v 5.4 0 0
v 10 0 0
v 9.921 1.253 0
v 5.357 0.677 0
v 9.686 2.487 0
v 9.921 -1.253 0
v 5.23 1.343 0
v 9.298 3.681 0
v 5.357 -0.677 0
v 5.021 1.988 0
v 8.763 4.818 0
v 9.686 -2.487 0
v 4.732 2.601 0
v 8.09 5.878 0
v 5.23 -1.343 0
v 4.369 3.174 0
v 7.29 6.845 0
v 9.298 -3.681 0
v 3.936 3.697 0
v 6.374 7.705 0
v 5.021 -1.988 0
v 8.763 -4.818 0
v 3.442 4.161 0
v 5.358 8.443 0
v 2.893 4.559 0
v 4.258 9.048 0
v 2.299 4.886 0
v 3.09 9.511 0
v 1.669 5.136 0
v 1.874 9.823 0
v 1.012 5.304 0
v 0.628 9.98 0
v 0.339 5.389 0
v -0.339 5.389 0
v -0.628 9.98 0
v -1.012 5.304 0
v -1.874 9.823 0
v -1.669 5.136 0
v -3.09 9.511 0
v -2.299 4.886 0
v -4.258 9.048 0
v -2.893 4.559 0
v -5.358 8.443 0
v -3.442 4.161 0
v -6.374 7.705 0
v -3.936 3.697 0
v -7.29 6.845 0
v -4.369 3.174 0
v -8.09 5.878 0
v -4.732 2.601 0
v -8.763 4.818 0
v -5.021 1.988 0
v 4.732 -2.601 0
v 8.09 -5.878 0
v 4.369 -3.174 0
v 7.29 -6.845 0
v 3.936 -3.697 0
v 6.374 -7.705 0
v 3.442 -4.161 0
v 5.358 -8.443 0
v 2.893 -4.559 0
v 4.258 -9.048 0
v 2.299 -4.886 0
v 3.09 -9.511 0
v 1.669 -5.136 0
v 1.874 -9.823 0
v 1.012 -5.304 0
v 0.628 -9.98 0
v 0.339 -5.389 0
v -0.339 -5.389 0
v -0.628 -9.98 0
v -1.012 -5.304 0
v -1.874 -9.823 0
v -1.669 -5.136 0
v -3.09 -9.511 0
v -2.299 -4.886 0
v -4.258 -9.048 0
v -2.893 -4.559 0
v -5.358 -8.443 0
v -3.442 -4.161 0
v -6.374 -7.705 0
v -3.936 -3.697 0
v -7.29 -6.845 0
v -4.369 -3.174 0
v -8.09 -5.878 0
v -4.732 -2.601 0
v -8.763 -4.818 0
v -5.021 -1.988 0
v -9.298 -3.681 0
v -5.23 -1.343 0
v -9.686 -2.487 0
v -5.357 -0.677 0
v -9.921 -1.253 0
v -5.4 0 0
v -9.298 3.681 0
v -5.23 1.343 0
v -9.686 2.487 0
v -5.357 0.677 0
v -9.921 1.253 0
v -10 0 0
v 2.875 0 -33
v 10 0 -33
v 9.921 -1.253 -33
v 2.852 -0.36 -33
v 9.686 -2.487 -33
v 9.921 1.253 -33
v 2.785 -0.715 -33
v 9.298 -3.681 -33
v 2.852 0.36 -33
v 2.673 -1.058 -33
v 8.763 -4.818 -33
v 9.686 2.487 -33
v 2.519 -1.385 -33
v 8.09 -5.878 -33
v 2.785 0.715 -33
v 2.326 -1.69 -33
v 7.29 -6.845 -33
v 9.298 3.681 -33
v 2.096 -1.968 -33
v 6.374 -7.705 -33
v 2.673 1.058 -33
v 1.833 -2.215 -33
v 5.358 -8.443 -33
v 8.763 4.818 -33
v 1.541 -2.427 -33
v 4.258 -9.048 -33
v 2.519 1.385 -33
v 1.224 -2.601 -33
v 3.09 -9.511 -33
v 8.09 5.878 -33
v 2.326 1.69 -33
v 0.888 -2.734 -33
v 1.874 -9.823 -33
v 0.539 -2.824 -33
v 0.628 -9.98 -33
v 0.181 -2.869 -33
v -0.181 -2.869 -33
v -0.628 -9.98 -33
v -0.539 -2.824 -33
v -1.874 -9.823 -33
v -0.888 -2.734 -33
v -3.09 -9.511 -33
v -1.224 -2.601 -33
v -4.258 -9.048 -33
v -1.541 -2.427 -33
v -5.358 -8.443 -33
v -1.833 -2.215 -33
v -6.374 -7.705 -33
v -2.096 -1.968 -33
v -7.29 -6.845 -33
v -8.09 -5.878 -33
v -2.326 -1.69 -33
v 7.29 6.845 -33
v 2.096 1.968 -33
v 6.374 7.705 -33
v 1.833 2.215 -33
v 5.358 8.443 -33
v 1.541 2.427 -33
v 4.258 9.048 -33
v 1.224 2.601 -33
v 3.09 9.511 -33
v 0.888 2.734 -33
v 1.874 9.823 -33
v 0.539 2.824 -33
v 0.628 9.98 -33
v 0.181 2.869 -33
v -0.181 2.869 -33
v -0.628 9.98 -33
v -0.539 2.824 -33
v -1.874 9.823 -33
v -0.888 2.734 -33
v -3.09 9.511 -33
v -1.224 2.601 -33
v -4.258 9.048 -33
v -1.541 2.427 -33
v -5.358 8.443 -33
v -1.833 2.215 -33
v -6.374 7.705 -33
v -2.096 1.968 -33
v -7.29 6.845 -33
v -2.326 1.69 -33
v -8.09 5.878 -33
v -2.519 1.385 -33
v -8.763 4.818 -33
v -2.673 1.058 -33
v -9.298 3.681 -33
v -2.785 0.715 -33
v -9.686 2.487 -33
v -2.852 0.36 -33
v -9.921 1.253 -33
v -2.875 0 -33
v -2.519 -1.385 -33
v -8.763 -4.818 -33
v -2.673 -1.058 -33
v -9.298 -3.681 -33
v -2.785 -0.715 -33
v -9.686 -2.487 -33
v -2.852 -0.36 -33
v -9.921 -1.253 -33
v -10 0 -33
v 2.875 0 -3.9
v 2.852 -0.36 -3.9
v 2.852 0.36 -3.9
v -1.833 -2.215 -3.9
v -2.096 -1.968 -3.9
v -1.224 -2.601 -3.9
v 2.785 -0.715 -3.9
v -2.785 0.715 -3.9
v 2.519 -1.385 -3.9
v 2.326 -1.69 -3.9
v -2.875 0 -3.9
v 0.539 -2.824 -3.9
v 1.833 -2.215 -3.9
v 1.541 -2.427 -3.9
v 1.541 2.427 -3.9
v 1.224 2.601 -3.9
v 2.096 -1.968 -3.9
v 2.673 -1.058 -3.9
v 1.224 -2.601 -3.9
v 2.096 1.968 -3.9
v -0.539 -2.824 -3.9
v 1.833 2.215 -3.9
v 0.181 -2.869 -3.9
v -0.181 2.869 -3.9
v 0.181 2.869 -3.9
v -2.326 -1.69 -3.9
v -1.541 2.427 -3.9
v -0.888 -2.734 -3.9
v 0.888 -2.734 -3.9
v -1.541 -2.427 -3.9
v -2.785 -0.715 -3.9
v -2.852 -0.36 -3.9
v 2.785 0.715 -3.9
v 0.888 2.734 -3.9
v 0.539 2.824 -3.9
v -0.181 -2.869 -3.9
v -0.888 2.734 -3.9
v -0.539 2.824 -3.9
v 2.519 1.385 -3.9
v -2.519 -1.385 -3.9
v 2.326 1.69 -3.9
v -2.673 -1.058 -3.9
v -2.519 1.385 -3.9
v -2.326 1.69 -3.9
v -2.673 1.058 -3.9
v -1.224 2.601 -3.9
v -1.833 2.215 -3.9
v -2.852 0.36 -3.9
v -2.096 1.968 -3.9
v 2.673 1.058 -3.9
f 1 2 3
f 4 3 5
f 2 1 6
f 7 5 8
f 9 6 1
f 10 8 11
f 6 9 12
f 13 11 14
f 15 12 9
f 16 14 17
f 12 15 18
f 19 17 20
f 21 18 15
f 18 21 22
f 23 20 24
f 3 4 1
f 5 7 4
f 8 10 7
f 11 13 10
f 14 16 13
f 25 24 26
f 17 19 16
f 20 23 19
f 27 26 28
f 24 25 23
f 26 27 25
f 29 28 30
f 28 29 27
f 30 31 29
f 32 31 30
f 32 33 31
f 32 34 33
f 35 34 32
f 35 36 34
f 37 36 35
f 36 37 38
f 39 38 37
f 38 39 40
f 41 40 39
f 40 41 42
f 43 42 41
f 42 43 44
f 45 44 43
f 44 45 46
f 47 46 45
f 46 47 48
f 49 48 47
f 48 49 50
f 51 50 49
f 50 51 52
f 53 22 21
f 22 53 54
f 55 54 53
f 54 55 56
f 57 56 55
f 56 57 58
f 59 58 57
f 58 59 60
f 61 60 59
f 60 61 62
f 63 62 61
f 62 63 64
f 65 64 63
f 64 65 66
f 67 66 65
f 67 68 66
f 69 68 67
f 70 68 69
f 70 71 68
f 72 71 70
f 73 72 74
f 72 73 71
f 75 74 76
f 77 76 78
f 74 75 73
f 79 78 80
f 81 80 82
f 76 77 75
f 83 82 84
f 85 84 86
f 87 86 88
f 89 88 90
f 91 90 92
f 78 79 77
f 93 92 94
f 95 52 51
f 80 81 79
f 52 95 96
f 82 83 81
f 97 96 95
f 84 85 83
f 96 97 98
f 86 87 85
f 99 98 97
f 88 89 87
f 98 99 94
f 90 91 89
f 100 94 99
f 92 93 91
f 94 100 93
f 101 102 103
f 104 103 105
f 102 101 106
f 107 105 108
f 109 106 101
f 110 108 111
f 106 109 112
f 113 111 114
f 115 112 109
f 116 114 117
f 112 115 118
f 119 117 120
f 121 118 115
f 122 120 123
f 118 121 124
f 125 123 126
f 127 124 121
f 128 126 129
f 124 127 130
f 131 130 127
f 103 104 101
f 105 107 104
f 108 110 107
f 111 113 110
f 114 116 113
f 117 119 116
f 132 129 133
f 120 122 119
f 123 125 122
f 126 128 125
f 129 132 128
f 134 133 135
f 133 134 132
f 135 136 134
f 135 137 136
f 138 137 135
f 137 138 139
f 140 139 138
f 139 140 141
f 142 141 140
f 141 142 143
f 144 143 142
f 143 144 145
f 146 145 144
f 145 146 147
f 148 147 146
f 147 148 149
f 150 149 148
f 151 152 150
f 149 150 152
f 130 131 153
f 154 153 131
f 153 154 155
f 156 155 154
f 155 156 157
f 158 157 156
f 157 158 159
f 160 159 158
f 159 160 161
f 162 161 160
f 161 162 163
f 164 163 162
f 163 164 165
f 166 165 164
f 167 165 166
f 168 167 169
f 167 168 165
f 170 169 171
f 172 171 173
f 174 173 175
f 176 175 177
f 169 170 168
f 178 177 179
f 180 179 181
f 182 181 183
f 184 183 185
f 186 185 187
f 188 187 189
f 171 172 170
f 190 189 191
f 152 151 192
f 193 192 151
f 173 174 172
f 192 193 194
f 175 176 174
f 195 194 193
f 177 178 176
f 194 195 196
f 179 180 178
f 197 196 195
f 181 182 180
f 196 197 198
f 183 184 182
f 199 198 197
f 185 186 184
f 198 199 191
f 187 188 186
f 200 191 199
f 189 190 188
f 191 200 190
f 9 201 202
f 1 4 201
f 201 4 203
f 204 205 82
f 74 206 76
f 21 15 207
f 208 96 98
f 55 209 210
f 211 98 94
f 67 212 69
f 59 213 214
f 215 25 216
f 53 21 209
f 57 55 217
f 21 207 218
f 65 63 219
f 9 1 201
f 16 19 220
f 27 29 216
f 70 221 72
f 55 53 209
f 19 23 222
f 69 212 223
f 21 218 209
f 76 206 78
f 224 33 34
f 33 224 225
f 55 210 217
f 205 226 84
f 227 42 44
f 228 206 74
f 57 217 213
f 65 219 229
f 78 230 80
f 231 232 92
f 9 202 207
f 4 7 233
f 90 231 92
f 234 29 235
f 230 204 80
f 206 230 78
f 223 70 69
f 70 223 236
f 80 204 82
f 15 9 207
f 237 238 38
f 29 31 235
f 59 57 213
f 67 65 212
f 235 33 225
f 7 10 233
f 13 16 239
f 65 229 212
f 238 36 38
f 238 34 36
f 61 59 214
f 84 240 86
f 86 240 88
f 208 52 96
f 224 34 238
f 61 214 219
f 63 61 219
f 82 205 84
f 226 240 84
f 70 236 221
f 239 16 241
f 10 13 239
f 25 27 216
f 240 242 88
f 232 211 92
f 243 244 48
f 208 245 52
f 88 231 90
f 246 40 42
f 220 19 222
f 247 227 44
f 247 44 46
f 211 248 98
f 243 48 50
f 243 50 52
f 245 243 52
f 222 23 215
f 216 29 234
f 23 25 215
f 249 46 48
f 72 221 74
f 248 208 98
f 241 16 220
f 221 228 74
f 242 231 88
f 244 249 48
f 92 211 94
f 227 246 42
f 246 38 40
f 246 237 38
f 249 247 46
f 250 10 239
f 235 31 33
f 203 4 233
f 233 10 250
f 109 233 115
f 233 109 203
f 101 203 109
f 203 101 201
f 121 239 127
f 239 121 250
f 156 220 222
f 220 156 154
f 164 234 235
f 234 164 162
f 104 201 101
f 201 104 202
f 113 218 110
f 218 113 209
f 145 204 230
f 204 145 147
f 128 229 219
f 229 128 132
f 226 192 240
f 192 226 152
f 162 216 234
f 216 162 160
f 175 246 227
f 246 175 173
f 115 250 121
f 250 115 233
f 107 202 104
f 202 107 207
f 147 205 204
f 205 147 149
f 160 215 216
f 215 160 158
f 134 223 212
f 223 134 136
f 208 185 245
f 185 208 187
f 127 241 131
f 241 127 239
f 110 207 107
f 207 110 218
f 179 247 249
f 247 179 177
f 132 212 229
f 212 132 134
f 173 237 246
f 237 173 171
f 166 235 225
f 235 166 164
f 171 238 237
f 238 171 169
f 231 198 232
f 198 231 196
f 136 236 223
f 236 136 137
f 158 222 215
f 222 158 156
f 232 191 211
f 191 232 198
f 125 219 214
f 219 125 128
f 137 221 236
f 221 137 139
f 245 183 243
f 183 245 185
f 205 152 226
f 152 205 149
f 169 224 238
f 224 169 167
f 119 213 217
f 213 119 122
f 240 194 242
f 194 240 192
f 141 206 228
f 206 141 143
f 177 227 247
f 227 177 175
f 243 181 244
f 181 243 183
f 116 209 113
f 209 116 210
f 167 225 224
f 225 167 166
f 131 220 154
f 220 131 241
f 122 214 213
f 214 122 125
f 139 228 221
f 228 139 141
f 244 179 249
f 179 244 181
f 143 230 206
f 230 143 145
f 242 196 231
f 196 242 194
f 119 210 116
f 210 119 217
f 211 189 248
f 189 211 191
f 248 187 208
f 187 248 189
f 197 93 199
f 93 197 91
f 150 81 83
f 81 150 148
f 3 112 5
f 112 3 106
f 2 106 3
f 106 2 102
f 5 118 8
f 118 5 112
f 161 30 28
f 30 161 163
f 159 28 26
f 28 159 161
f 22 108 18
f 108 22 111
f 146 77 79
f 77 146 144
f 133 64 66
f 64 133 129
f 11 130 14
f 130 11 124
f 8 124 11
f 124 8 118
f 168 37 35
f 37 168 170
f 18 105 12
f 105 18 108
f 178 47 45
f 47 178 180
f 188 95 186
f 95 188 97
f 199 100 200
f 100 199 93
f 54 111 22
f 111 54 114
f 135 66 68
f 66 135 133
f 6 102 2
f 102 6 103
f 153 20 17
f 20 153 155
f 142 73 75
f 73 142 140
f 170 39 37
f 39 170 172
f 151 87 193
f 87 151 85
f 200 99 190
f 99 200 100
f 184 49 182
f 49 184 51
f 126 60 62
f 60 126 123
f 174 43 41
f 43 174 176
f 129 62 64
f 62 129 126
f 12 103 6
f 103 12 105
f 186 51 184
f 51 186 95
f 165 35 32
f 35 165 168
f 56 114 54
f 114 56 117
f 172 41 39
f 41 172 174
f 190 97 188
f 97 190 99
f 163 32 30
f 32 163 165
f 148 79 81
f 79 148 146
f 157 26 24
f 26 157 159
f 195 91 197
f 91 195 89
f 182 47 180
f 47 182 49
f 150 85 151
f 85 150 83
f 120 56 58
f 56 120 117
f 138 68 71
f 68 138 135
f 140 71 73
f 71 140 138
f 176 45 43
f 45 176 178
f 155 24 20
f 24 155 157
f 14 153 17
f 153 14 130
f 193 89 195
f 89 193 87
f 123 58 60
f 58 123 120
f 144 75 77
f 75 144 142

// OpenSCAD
$fn = 50;


difference() {
	union() {
		translate(v = [0, 0, -33.0000000000]) {
			cylinder(h = 33, r = 10.0000000000);
		}
		cylinder(h = 0, r = 20.0000000000);
	}
	union() {
		translate(v = [0, 0, 0]) {
			rotate(a = [0, 0, 0]) {
				difference() {
					union() {
						#translate(v = [0, 0, -33.0000000000]) {
							cylinder(h = 33, r = 2.6000000000);
						}
						#translate(v = [0, 0, -3.9000000000]) {
							cylinder(h = 3.9000000000, r = 10.0000000000, r1 = 2.8750000000, r2 = 5.4000000000);
						}
						#translate(v = [0, 0, -33.0000000000]) {
							cylinder(h = 33, r = 2.8750000000);
						}
						#translate(v = [0, 0, -33.0000000000]) {
							cylinder(h = 33, r = 2.6000000000);
						}
					}
					union();
				}
			}
		}
	}
}
